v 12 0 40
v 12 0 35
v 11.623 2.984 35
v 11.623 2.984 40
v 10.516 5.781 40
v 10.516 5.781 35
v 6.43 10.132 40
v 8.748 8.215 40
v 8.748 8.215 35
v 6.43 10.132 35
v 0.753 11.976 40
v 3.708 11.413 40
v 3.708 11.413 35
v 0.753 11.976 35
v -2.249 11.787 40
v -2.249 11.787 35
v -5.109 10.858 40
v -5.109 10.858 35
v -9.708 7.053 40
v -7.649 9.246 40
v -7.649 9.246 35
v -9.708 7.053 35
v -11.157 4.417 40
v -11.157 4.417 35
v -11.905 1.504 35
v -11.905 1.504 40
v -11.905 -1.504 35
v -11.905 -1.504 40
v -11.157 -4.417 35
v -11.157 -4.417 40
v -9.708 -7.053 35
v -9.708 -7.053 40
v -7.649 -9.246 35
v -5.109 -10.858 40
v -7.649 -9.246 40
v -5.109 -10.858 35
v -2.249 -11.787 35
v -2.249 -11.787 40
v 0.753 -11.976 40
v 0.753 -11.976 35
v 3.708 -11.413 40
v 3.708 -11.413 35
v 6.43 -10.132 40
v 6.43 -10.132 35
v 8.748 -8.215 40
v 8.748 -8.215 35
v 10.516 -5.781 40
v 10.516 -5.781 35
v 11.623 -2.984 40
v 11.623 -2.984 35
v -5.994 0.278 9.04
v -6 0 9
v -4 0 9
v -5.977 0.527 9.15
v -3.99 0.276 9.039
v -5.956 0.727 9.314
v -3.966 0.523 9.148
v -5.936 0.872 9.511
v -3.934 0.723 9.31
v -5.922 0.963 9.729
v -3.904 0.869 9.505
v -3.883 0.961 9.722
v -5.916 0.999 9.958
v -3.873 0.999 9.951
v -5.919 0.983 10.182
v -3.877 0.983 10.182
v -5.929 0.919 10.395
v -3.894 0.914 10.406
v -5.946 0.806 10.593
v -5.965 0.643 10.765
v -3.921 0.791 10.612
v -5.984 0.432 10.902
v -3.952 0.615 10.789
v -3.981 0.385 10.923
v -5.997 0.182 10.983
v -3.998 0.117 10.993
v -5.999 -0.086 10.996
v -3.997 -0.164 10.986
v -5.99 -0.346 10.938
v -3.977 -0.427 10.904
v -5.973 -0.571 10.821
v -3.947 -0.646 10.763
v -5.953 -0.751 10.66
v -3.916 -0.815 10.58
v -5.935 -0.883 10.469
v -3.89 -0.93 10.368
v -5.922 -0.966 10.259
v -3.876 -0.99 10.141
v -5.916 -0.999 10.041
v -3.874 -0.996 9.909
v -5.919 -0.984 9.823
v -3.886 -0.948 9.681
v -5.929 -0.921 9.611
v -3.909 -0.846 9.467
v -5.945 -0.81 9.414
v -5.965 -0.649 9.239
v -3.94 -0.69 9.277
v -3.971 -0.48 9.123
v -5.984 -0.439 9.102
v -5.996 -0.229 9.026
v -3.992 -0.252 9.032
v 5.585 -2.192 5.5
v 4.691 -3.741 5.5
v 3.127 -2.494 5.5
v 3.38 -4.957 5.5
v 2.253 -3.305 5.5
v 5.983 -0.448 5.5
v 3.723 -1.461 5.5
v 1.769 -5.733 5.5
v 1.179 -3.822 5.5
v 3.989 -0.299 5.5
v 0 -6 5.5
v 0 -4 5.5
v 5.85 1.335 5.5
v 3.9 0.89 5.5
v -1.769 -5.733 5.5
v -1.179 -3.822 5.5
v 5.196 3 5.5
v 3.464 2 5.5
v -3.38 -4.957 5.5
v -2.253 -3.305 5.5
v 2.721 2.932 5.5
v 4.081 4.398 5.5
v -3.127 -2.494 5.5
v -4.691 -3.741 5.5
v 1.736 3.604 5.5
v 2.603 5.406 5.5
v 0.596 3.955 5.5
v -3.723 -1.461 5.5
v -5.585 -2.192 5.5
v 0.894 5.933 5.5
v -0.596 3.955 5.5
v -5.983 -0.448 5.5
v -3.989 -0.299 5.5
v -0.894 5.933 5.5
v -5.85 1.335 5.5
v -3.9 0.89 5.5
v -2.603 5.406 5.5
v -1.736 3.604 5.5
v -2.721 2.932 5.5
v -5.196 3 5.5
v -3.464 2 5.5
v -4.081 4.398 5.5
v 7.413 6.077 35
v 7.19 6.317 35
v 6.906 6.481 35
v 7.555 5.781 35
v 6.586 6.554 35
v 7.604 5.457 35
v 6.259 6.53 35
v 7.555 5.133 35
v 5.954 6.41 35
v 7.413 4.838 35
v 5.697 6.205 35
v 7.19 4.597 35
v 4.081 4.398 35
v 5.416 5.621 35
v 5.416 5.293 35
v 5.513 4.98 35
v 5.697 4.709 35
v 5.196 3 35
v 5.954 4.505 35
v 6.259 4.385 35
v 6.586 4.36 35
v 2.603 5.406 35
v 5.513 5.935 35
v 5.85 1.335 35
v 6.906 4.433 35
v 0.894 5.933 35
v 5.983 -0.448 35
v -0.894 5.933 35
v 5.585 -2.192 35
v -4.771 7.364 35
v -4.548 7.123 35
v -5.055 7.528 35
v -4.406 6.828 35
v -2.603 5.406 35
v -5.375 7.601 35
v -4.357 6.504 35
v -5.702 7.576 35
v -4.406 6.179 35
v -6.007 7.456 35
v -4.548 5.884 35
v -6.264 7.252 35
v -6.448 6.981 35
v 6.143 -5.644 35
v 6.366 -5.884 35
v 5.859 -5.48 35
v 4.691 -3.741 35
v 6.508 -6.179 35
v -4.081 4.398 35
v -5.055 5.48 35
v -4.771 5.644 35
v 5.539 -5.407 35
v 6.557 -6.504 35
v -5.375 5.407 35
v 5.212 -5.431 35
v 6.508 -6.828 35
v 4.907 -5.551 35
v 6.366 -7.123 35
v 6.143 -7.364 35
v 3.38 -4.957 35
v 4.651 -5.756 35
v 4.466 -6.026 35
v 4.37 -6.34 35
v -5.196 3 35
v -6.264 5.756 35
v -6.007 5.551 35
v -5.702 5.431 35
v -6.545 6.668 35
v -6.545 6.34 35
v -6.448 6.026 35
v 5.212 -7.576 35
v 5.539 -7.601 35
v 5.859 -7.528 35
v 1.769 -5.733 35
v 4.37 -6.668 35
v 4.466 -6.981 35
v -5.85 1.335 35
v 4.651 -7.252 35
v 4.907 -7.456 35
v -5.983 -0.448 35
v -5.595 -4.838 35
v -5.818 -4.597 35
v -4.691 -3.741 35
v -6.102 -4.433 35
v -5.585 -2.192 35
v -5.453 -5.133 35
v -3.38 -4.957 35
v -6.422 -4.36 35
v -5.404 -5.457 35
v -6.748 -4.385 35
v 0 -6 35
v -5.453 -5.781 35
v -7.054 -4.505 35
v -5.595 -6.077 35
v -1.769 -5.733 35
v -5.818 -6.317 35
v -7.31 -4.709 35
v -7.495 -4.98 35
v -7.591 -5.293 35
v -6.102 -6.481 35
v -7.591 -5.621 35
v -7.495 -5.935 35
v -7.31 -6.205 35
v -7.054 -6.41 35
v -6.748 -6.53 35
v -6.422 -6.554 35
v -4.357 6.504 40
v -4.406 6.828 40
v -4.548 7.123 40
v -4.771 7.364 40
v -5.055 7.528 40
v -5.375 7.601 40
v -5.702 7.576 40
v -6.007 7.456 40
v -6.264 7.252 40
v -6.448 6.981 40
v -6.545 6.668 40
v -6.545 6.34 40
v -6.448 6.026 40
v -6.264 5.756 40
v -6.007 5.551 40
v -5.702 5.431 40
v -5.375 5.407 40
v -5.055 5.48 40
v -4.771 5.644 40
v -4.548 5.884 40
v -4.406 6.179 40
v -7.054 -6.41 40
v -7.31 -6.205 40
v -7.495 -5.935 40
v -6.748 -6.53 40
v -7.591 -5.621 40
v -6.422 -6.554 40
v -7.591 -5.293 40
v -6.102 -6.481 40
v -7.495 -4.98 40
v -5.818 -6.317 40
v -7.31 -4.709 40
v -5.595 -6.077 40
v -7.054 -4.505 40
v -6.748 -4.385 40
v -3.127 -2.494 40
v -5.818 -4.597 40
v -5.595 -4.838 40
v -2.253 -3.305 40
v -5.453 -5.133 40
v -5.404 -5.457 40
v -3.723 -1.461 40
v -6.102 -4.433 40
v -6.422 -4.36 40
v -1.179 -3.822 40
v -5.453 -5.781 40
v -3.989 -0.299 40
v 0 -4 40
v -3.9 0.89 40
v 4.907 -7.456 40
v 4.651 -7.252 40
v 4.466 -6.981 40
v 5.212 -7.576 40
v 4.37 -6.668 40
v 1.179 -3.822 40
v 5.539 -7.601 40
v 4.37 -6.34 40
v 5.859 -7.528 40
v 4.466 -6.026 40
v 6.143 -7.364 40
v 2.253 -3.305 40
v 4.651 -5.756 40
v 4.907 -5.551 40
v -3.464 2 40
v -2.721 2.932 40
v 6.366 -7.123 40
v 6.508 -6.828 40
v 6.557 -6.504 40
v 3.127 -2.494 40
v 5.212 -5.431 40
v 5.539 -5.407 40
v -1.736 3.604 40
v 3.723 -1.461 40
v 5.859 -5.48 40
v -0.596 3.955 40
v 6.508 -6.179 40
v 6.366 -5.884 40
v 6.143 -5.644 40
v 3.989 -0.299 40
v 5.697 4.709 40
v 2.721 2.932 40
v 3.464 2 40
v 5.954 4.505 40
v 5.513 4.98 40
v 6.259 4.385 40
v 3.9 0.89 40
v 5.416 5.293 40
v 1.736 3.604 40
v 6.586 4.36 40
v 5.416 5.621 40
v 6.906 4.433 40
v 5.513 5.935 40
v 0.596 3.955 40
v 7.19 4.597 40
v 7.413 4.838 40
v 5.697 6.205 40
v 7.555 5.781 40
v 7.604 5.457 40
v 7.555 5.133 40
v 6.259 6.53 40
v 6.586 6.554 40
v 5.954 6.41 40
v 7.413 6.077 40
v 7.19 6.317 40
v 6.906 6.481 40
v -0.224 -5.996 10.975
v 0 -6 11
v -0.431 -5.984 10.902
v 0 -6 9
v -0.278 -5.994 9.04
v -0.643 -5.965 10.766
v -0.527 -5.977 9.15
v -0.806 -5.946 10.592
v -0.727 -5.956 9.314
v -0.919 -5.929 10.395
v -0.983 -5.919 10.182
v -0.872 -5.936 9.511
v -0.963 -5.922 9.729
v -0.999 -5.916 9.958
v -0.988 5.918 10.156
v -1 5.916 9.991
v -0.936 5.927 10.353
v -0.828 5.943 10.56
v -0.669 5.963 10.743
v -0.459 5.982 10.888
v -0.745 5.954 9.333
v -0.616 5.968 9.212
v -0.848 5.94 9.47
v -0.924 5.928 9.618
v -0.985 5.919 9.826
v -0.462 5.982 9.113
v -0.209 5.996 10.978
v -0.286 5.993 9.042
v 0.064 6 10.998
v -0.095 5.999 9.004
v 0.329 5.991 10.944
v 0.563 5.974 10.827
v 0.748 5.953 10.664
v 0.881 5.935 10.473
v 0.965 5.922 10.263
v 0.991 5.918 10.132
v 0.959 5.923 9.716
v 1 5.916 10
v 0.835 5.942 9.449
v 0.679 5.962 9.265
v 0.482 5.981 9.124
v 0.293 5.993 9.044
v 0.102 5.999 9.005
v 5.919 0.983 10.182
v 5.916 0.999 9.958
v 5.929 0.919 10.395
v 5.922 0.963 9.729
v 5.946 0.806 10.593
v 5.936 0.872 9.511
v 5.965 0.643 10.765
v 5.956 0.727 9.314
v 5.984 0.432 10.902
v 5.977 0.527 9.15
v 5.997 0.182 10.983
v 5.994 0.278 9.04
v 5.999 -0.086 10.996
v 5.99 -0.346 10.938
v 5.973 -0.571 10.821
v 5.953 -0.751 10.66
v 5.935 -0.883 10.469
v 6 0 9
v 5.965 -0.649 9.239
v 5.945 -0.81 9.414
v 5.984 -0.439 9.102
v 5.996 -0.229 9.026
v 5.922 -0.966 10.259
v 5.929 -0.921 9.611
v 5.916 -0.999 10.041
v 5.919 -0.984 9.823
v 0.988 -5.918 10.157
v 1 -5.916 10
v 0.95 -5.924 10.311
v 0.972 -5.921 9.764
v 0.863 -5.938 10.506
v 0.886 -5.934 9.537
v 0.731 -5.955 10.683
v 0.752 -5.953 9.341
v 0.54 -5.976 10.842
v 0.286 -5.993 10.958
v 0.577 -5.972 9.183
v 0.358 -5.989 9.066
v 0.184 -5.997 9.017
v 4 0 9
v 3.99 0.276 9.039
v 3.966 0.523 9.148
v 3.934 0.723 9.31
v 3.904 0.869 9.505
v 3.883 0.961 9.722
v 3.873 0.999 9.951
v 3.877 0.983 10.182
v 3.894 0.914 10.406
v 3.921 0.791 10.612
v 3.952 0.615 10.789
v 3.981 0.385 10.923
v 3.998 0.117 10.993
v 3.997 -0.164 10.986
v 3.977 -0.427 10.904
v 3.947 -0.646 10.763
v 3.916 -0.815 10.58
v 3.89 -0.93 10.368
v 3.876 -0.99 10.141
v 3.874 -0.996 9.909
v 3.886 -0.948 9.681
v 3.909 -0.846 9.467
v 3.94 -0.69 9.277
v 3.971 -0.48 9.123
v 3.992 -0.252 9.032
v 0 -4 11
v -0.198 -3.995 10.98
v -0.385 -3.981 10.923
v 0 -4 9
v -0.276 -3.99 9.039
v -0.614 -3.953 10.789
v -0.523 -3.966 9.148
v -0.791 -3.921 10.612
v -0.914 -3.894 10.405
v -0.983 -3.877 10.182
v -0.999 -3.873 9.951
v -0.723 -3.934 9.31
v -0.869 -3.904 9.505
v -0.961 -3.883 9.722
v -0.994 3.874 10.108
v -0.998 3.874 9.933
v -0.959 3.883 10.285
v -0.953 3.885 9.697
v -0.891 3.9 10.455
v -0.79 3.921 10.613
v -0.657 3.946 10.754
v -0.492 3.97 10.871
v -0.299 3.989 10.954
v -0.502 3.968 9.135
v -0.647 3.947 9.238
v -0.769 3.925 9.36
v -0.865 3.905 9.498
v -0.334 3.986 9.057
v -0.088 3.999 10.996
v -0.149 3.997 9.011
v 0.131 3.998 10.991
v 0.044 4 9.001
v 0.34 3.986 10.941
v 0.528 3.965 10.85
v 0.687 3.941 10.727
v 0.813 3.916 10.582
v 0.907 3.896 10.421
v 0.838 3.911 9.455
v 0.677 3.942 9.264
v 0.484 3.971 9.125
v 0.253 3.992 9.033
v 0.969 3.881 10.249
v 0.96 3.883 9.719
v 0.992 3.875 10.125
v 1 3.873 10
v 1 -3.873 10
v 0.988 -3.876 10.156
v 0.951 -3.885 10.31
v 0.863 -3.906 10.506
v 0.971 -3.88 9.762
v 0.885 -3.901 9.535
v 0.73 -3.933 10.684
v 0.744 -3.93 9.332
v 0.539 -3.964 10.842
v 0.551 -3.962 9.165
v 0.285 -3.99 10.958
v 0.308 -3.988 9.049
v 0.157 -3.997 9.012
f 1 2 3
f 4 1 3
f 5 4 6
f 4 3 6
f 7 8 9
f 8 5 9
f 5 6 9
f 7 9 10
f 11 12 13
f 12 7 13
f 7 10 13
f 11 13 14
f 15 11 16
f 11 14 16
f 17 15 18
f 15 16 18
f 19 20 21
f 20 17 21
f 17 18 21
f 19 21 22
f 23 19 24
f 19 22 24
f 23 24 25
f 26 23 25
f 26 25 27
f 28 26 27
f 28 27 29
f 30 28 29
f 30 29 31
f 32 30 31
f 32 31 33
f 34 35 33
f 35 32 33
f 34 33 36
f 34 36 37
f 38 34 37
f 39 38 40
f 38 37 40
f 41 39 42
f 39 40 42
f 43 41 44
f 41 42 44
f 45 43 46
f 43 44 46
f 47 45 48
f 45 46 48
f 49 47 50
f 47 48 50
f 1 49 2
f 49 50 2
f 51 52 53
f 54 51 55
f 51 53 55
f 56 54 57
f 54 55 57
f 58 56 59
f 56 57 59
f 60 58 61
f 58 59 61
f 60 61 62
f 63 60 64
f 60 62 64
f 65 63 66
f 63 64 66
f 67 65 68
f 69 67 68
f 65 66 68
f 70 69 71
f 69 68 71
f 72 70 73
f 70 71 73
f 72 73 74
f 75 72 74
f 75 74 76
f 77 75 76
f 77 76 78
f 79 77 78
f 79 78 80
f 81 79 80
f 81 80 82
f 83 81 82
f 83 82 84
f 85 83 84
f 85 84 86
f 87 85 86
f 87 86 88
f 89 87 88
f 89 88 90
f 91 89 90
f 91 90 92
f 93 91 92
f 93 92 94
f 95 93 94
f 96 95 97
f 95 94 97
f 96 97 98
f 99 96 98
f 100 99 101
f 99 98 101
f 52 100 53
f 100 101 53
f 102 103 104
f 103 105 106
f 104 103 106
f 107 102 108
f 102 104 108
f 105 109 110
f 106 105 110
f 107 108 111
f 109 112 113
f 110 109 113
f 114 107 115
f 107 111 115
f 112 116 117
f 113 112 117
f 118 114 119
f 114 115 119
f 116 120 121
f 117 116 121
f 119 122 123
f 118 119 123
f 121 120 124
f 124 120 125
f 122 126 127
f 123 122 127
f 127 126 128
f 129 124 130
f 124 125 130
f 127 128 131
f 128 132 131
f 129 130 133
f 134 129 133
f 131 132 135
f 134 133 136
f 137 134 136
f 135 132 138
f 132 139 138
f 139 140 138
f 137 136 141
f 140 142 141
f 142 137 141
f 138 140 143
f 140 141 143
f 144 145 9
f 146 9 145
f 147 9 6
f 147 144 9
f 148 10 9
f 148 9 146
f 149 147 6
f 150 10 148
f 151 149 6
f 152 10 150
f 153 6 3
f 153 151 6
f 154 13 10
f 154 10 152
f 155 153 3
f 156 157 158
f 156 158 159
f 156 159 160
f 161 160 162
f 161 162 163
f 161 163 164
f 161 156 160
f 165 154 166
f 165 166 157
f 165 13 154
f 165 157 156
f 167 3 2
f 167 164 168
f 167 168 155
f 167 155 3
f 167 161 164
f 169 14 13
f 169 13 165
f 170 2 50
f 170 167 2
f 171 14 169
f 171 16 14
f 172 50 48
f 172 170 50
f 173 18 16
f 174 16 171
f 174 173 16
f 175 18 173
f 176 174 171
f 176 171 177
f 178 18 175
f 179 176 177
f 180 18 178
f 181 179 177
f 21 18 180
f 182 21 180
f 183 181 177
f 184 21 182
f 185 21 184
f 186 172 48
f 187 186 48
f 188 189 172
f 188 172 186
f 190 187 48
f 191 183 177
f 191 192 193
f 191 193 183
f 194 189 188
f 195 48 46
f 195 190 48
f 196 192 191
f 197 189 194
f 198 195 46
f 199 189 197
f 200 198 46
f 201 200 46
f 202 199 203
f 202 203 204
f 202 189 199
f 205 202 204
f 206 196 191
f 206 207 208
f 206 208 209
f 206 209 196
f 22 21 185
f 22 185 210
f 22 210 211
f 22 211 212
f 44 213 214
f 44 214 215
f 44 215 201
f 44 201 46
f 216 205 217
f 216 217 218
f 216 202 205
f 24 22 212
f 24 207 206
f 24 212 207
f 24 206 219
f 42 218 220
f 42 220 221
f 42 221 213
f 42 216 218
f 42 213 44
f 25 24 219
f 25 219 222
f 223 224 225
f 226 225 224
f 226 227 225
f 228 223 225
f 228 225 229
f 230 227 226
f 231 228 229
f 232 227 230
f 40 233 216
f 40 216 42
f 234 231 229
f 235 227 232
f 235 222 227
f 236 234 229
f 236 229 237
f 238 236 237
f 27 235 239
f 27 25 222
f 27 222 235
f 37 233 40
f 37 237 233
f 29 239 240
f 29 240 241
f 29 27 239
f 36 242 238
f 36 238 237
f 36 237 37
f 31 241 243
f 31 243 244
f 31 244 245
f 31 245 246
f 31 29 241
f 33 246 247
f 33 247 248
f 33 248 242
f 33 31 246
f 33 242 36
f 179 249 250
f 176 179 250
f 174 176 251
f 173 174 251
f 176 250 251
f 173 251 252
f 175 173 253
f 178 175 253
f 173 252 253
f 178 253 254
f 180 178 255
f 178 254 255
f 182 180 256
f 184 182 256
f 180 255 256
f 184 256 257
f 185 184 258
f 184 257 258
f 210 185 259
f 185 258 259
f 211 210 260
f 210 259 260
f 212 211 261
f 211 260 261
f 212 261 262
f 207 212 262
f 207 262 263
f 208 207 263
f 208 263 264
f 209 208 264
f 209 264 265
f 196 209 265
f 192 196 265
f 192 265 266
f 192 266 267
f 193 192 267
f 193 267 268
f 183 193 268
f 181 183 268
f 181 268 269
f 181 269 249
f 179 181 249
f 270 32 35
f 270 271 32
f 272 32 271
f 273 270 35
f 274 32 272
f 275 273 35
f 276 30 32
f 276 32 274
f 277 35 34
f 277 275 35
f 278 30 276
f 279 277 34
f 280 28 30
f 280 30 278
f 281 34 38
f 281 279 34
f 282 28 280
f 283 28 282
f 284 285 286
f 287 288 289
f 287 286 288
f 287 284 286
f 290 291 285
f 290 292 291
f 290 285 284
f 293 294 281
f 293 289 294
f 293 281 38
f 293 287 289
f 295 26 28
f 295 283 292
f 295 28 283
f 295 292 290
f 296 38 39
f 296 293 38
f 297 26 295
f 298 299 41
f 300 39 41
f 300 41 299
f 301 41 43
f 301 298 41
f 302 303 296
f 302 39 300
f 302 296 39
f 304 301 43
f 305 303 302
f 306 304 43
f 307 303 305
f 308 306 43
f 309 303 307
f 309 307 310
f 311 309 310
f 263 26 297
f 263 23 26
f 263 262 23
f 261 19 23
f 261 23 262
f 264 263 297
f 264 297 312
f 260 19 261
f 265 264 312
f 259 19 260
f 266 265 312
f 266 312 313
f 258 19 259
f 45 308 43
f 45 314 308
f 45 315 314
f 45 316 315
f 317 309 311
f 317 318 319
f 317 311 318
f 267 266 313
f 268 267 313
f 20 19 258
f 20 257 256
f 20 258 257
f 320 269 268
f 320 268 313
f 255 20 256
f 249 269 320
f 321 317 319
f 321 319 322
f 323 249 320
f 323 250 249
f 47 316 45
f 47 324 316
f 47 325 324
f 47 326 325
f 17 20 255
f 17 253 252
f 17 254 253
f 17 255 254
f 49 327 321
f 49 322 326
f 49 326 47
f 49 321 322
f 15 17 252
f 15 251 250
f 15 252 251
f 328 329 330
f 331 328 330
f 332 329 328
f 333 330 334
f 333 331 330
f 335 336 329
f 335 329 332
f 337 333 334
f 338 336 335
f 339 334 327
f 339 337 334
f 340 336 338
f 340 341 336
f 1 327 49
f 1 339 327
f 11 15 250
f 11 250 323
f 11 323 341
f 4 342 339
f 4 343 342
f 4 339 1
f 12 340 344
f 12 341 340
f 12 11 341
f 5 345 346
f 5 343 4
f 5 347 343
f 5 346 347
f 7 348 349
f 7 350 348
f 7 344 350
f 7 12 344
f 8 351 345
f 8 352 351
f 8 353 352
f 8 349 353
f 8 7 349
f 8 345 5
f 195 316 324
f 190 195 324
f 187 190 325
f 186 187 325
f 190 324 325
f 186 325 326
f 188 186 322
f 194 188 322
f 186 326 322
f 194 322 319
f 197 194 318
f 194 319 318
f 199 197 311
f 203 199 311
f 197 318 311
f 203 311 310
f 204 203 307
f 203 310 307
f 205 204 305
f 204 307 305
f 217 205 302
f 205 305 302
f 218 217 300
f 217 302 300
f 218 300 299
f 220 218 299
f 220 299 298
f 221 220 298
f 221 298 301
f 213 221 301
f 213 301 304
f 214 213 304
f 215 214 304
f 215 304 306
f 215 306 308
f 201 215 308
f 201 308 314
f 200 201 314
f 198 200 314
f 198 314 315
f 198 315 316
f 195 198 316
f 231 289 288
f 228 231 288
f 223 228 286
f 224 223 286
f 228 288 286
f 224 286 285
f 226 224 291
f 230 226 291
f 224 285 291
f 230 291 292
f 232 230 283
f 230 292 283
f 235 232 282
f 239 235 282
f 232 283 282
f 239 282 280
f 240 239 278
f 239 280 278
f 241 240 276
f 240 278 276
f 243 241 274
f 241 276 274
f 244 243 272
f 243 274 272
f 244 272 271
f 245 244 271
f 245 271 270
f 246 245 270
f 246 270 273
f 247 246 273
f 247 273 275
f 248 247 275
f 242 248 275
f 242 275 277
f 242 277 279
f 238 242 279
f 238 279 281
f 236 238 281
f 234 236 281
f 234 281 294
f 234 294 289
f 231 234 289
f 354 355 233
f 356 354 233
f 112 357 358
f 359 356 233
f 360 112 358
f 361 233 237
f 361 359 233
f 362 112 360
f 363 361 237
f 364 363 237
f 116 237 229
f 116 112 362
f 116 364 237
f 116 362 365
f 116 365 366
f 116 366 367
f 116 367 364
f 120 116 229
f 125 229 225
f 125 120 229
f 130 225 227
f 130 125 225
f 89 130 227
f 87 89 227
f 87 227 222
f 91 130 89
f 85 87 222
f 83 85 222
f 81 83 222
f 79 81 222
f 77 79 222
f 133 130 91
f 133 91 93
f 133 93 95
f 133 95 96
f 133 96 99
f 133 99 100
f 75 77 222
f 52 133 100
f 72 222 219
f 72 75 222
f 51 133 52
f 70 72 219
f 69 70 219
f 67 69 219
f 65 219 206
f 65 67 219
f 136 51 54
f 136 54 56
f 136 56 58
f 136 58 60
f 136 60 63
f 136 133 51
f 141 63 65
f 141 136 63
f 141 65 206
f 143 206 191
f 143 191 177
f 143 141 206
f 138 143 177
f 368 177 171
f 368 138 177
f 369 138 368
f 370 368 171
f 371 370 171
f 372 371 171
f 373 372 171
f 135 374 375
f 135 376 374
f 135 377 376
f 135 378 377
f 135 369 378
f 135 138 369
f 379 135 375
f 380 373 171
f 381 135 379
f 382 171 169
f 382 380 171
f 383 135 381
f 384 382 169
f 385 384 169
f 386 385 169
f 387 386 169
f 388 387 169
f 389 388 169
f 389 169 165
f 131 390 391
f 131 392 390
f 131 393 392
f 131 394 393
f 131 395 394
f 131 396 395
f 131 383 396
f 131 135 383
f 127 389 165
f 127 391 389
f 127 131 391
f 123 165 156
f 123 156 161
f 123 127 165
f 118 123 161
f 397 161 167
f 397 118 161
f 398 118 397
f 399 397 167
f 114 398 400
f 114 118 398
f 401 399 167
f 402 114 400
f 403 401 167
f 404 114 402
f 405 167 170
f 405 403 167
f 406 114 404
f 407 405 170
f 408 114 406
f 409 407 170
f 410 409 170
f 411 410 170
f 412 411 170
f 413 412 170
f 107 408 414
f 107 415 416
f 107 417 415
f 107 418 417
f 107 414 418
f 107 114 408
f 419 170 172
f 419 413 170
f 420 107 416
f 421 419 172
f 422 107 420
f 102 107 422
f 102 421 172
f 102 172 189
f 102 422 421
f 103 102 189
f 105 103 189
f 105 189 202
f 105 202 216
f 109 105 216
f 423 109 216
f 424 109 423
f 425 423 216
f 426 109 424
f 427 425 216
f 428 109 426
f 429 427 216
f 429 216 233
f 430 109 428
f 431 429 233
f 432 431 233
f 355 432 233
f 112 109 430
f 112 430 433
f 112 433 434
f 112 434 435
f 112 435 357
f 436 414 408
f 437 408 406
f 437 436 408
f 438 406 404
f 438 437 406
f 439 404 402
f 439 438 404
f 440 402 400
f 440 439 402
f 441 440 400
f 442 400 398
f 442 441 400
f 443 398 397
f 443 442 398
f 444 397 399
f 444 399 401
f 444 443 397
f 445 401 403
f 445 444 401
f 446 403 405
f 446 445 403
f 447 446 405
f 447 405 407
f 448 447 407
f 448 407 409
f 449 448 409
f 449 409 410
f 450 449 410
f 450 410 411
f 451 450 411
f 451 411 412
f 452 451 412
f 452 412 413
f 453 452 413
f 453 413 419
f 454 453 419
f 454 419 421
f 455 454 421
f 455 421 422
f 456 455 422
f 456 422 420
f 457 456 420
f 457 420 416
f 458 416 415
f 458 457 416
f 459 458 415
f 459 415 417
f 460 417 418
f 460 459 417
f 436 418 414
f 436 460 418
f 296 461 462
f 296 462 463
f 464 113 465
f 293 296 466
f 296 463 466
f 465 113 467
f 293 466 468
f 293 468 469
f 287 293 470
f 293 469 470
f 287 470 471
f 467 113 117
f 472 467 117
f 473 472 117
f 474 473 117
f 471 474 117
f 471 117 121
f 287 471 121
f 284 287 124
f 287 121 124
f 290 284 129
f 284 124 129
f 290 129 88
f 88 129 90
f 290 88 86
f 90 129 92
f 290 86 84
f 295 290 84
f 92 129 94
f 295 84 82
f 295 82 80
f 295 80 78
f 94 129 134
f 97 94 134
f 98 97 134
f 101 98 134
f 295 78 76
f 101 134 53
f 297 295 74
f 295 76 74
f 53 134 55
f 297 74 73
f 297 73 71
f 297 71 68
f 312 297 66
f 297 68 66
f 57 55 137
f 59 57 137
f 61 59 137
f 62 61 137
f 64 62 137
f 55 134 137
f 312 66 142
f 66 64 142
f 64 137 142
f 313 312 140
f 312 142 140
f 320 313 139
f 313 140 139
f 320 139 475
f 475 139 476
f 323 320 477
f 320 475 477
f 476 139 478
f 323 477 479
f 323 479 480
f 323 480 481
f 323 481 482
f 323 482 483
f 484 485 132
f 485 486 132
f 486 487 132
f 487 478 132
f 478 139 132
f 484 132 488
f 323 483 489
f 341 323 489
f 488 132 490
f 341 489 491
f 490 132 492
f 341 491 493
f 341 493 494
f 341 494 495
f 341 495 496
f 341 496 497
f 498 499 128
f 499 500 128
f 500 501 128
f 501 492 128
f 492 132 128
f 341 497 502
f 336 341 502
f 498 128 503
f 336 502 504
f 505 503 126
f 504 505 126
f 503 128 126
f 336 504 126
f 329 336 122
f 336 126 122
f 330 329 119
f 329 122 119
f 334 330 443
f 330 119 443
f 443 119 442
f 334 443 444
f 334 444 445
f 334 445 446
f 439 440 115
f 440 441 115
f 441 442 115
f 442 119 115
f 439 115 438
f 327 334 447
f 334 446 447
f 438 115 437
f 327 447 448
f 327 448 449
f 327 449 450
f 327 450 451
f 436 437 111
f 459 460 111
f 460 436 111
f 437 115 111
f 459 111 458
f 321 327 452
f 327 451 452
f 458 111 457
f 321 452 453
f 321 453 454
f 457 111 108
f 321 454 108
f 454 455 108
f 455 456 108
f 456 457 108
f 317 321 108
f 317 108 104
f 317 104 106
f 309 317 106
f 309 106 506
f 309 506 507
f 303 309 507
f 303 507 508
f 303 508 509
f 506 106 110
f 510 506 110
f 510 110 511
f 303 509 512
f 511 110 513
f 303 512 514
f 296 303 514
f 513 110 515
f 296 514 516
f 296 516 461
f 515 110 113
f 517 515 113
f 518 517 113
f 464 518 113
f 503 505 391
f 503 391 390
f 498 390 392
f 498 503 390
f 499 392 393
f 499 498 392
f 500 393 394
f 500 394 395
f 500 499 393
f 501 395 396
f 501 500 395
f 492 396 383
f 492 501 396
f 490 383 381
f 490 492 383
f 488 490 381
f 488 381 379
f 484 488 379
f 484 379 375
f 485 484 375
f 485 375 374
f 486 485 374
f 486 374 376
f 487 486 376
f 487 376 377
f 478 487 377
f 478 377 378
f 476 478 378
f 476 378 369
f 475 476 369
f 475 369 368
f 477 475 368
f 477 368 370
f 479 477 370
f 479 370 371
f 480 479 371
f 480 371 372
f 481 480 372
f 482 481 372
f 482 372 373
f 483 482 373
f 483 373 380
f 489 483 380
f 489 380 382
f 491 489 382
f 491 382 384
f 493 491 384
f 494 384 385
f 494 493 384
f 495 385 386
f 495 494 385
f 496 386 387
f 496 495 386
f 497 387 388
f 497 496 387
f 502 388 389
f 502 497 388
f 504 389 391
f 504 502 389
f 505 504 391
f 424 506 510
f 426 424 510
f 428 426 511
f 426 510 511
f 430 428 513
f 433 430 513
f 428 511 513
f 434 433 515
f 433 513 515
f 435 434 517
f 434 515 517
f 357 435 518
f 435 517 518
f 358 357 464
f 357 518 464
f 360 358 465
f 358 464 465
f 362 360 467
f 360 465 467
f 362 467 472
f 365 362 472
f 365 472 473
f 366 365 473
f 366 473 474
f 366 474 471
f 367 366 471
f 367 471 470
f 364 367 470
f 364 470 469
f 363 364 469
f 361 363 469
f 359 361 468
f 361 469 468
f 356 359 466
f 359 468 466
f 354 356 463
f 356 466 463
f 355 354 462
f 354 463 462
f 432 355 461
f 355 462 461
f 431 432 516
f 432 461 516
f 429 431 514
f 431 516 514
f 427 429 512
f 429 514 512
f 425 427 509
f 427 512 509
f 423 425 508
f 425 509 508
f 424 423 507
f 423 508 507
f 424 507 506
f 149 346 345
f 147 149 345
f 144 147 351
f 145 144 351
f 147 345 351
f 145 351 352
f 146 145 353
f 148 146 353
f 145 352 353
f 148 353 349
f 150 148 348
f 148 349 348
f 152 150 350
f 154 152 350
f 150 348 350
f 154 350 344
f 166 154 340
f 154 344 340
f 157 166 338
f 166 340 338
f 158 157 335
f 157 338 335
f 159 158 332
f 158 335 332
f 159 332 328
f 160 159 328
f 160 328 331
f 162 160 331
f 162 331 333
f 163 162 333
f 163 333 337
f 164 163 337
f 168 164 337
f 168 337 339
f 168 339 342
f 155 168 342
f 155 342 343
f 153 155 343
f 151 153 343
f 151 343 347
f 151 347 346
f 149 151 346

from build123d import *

# Parameters (mm, degrees)
SKIZZE1_R                            = 12.5
AUFSATZ_LINEAR_AUSTRAGEN1_DEPTH      = 40
SCHNITT_LINEAR_START                 = 30
SKIZZE4_R                            = 15
SKIZZE4_R_2                          = 12
SCHNITT_LINEAR_AUSTRAGEN1_DEPTH      = 20
SKIZZE5_R                            = 1.1
SCHNITT_LINEAR_AUSTRAGEN2_DEPTH      = 20
SKIZZE6_R                            = 1
SCHNITT_LINEAR_AUSTRAGEN3_DEPTH      = 10
SKIZZE8_W                            = 5.5
SKIZZE8_H                            = 25
SCHNITT_LINEAR_AUSTRAGEN5_DEPTH      = 13.5
SCHNITT_LINEAR_AUSTRAGEN5_DEPTH_BACK = 13.5
SKIZZE9_R                            = 1
SCHNITT_LINEAR_AUSTRAGEN6_DEPTH      = 13
SCHNITT_LINEAR_AUSTRAGEN6_DEPTH_BACK = 13
SKIZZE11_R                           = 1
SCHNITT_LINEAR_AUSTRAGEN7_DEPTH      = 13
SCHNITT_LINEAR_AUSTRAGEN7_DEPTH_BACK = 13


with BuildPart() as part:
    # Skizze1 → Aufsatz-Linear austragen1 (new body)
    with BuildSketch(Plane.XY):
        Circle(SKIZZE1_R)
    extrude(amount=AUFSATZ_LINEAR_AUSTRAGEN1_DEPTH)

    # Skizze2 → Schnitt-Rotation3 (revolve, cut)
    with BuildSketch(Plane(origin=(0, 0, 0), x_dir=(0, 0, -1), z_dir=(1, 0, 0))):
        Polygon((-35, -12.5), (-35, -6), (-5, -6), (-5, -12.5), (-33.974333956, -17.5), align=None)
    revolve(axis=Axis((0, 0, 40), (0, 0, -1)), mode=Mode.SUBTRACT)

    # Skizze4 → Schnitt-Linear austragen1 (cut)
    with BuildSketch(Plane.XY.offset(SCHNITT_LINEAR_START)):
        Circle(SKIZZE4_R)
        Circle(SKIZZE4_R_2, mode=Mode.SUBTRACT)
    extrude(amount=SCHNITT_LINEAR_AUSTRAGEN1_DEPTH, mode=Mode.SUBTRACT)

    # Skizze5 → Schnitt-Linear austragen2 (cut)
    with BuildSketch(Plane.XY.offset(40)):
        with Locations((-5.457266806, 6.503717322)):
            Circle(SKIZZE5_R)
        with Locations((6.503717322, 5.457266806)):
            Circle(SKIZZE5_R)
        with Locations((5.457266806, -6.503717322)):
            Circle(SKIZZE5_R)
        with Locations((-6.503717322, -5.457266806)):
            Circle(SKIZZE5_R)
    extrude(amount=-SCHNITT_LINEAR_AUSTRAGEN2_DEPTH, mode=Mode.SUBTRACT)

    # Skizze6 → Schnitt-Linear austragen3 (cut)
    with BuildSketch(Plane(origin=(0, 0, 0), x_dir=(-1, 0, 0), z_dir=(0, 0, -1))):
        with Locations((-2.25, 0)):
            Circle(SKIZZE6_R)
        with Locations((0, 2.25)):
            Circle(SKIZZE6_R)
        with Locations((2.25, 0)):
            Circle(SKIZZE6_R)
        with Locations((0, -2.25)):
            Circle(SKIZZE6_R)
    extrude(amount=-SCHNITT_LINEAR_AUSTRAGEN3_DEPTH, mode=Mode.SUBTRACT)

    # Skizze7 → Schnitt-Rotation4 (revolve, cut)
    with BuildSketch(Plane(origin=(0, 0, 0), x_dir=(0, 0, -1), z_dir=(1, 0, 0))):
        Polygon((-5.069914244, 0), (-35.074978214, 0), (-40, 0), (-42.313201415, 0), (-42.313201415, -4), (-40, -4), (-35, -4), (-5, -4), align=None)
    revolve(axis=Axis((0, 0, 40), (0, 0, -1)), mode=Mode.SUBTRACT)

    # Skizze8 → Schnitt-Linear austragen5 (cut, two sides)
    with BuildSketch(Plane(origin=(0, 0, 0), x_dir=(0, 0, -1), z_dir=(1, 0, 0))) as schnitt_linear_austragen5_sk:
        with Locations((-2.75, 0)):
            Rectangle(SKIZZE8_W, SKIZZE8_H)
    extrude(amount=SCHNITT_LINEAR_AUSTRAGEN5_DEPTH, mode=Mode.SUBTRACT)
    extrude(schnitt_linear_austragen5_sk.sketch, amount=-SCHNITT_LINEAR_AUSTRAGEN5_DEPTH_BACK, mode=Mode.SUBTRACT)

    # Skizze9 → Schnitt-Linear austragen6 (cut, two sides)
    with BuildSketch(Plane(origin=(0, 0, 0), x_dir=(0, 0, -1), z_dir=(1, 0, 0))) as schnitt_linear_austragen6_sk:
        with Locations((-10, 0)):
            Circle(SKIZZE9_R)
    extrude(amount=SCHNITT_LINEAR_AUSTRAGEN6_DEPTH, mode=Mode.SUBTRACT)
    extrude(schnitt_linear_austragen6_sk.sketch, amount=-SCHNITT_LINEAR_AUSTRAGEN6_DEPTH_BACK, mode=Mode.SUBTRACT)

    # Skizze11 → Schnitt-Linear austragen7 (cut, two sides)
    with BuildSketch(Plane(origin=(0, 0, 0), x_dir=(1, 0, 0), z_dir=(0, 1, 0))) as schnitt_linear_austragen7_sk:
        with Locations((0, -10)):
            Circle(SKIZZE11_R)
    extrude(amount=SCHNITT_LINEAR_AUSTRAGEN7_DEPTH, mode=Mode.SUBTRACT)
    extrude(schnitt_linear_austragen7_sk.sketch, amount=-SCHNITT_LINEAR_AUSTRAGEN7_DEPTH_BACK, mode=Mode.SUBTRACT)


solid = part.part
